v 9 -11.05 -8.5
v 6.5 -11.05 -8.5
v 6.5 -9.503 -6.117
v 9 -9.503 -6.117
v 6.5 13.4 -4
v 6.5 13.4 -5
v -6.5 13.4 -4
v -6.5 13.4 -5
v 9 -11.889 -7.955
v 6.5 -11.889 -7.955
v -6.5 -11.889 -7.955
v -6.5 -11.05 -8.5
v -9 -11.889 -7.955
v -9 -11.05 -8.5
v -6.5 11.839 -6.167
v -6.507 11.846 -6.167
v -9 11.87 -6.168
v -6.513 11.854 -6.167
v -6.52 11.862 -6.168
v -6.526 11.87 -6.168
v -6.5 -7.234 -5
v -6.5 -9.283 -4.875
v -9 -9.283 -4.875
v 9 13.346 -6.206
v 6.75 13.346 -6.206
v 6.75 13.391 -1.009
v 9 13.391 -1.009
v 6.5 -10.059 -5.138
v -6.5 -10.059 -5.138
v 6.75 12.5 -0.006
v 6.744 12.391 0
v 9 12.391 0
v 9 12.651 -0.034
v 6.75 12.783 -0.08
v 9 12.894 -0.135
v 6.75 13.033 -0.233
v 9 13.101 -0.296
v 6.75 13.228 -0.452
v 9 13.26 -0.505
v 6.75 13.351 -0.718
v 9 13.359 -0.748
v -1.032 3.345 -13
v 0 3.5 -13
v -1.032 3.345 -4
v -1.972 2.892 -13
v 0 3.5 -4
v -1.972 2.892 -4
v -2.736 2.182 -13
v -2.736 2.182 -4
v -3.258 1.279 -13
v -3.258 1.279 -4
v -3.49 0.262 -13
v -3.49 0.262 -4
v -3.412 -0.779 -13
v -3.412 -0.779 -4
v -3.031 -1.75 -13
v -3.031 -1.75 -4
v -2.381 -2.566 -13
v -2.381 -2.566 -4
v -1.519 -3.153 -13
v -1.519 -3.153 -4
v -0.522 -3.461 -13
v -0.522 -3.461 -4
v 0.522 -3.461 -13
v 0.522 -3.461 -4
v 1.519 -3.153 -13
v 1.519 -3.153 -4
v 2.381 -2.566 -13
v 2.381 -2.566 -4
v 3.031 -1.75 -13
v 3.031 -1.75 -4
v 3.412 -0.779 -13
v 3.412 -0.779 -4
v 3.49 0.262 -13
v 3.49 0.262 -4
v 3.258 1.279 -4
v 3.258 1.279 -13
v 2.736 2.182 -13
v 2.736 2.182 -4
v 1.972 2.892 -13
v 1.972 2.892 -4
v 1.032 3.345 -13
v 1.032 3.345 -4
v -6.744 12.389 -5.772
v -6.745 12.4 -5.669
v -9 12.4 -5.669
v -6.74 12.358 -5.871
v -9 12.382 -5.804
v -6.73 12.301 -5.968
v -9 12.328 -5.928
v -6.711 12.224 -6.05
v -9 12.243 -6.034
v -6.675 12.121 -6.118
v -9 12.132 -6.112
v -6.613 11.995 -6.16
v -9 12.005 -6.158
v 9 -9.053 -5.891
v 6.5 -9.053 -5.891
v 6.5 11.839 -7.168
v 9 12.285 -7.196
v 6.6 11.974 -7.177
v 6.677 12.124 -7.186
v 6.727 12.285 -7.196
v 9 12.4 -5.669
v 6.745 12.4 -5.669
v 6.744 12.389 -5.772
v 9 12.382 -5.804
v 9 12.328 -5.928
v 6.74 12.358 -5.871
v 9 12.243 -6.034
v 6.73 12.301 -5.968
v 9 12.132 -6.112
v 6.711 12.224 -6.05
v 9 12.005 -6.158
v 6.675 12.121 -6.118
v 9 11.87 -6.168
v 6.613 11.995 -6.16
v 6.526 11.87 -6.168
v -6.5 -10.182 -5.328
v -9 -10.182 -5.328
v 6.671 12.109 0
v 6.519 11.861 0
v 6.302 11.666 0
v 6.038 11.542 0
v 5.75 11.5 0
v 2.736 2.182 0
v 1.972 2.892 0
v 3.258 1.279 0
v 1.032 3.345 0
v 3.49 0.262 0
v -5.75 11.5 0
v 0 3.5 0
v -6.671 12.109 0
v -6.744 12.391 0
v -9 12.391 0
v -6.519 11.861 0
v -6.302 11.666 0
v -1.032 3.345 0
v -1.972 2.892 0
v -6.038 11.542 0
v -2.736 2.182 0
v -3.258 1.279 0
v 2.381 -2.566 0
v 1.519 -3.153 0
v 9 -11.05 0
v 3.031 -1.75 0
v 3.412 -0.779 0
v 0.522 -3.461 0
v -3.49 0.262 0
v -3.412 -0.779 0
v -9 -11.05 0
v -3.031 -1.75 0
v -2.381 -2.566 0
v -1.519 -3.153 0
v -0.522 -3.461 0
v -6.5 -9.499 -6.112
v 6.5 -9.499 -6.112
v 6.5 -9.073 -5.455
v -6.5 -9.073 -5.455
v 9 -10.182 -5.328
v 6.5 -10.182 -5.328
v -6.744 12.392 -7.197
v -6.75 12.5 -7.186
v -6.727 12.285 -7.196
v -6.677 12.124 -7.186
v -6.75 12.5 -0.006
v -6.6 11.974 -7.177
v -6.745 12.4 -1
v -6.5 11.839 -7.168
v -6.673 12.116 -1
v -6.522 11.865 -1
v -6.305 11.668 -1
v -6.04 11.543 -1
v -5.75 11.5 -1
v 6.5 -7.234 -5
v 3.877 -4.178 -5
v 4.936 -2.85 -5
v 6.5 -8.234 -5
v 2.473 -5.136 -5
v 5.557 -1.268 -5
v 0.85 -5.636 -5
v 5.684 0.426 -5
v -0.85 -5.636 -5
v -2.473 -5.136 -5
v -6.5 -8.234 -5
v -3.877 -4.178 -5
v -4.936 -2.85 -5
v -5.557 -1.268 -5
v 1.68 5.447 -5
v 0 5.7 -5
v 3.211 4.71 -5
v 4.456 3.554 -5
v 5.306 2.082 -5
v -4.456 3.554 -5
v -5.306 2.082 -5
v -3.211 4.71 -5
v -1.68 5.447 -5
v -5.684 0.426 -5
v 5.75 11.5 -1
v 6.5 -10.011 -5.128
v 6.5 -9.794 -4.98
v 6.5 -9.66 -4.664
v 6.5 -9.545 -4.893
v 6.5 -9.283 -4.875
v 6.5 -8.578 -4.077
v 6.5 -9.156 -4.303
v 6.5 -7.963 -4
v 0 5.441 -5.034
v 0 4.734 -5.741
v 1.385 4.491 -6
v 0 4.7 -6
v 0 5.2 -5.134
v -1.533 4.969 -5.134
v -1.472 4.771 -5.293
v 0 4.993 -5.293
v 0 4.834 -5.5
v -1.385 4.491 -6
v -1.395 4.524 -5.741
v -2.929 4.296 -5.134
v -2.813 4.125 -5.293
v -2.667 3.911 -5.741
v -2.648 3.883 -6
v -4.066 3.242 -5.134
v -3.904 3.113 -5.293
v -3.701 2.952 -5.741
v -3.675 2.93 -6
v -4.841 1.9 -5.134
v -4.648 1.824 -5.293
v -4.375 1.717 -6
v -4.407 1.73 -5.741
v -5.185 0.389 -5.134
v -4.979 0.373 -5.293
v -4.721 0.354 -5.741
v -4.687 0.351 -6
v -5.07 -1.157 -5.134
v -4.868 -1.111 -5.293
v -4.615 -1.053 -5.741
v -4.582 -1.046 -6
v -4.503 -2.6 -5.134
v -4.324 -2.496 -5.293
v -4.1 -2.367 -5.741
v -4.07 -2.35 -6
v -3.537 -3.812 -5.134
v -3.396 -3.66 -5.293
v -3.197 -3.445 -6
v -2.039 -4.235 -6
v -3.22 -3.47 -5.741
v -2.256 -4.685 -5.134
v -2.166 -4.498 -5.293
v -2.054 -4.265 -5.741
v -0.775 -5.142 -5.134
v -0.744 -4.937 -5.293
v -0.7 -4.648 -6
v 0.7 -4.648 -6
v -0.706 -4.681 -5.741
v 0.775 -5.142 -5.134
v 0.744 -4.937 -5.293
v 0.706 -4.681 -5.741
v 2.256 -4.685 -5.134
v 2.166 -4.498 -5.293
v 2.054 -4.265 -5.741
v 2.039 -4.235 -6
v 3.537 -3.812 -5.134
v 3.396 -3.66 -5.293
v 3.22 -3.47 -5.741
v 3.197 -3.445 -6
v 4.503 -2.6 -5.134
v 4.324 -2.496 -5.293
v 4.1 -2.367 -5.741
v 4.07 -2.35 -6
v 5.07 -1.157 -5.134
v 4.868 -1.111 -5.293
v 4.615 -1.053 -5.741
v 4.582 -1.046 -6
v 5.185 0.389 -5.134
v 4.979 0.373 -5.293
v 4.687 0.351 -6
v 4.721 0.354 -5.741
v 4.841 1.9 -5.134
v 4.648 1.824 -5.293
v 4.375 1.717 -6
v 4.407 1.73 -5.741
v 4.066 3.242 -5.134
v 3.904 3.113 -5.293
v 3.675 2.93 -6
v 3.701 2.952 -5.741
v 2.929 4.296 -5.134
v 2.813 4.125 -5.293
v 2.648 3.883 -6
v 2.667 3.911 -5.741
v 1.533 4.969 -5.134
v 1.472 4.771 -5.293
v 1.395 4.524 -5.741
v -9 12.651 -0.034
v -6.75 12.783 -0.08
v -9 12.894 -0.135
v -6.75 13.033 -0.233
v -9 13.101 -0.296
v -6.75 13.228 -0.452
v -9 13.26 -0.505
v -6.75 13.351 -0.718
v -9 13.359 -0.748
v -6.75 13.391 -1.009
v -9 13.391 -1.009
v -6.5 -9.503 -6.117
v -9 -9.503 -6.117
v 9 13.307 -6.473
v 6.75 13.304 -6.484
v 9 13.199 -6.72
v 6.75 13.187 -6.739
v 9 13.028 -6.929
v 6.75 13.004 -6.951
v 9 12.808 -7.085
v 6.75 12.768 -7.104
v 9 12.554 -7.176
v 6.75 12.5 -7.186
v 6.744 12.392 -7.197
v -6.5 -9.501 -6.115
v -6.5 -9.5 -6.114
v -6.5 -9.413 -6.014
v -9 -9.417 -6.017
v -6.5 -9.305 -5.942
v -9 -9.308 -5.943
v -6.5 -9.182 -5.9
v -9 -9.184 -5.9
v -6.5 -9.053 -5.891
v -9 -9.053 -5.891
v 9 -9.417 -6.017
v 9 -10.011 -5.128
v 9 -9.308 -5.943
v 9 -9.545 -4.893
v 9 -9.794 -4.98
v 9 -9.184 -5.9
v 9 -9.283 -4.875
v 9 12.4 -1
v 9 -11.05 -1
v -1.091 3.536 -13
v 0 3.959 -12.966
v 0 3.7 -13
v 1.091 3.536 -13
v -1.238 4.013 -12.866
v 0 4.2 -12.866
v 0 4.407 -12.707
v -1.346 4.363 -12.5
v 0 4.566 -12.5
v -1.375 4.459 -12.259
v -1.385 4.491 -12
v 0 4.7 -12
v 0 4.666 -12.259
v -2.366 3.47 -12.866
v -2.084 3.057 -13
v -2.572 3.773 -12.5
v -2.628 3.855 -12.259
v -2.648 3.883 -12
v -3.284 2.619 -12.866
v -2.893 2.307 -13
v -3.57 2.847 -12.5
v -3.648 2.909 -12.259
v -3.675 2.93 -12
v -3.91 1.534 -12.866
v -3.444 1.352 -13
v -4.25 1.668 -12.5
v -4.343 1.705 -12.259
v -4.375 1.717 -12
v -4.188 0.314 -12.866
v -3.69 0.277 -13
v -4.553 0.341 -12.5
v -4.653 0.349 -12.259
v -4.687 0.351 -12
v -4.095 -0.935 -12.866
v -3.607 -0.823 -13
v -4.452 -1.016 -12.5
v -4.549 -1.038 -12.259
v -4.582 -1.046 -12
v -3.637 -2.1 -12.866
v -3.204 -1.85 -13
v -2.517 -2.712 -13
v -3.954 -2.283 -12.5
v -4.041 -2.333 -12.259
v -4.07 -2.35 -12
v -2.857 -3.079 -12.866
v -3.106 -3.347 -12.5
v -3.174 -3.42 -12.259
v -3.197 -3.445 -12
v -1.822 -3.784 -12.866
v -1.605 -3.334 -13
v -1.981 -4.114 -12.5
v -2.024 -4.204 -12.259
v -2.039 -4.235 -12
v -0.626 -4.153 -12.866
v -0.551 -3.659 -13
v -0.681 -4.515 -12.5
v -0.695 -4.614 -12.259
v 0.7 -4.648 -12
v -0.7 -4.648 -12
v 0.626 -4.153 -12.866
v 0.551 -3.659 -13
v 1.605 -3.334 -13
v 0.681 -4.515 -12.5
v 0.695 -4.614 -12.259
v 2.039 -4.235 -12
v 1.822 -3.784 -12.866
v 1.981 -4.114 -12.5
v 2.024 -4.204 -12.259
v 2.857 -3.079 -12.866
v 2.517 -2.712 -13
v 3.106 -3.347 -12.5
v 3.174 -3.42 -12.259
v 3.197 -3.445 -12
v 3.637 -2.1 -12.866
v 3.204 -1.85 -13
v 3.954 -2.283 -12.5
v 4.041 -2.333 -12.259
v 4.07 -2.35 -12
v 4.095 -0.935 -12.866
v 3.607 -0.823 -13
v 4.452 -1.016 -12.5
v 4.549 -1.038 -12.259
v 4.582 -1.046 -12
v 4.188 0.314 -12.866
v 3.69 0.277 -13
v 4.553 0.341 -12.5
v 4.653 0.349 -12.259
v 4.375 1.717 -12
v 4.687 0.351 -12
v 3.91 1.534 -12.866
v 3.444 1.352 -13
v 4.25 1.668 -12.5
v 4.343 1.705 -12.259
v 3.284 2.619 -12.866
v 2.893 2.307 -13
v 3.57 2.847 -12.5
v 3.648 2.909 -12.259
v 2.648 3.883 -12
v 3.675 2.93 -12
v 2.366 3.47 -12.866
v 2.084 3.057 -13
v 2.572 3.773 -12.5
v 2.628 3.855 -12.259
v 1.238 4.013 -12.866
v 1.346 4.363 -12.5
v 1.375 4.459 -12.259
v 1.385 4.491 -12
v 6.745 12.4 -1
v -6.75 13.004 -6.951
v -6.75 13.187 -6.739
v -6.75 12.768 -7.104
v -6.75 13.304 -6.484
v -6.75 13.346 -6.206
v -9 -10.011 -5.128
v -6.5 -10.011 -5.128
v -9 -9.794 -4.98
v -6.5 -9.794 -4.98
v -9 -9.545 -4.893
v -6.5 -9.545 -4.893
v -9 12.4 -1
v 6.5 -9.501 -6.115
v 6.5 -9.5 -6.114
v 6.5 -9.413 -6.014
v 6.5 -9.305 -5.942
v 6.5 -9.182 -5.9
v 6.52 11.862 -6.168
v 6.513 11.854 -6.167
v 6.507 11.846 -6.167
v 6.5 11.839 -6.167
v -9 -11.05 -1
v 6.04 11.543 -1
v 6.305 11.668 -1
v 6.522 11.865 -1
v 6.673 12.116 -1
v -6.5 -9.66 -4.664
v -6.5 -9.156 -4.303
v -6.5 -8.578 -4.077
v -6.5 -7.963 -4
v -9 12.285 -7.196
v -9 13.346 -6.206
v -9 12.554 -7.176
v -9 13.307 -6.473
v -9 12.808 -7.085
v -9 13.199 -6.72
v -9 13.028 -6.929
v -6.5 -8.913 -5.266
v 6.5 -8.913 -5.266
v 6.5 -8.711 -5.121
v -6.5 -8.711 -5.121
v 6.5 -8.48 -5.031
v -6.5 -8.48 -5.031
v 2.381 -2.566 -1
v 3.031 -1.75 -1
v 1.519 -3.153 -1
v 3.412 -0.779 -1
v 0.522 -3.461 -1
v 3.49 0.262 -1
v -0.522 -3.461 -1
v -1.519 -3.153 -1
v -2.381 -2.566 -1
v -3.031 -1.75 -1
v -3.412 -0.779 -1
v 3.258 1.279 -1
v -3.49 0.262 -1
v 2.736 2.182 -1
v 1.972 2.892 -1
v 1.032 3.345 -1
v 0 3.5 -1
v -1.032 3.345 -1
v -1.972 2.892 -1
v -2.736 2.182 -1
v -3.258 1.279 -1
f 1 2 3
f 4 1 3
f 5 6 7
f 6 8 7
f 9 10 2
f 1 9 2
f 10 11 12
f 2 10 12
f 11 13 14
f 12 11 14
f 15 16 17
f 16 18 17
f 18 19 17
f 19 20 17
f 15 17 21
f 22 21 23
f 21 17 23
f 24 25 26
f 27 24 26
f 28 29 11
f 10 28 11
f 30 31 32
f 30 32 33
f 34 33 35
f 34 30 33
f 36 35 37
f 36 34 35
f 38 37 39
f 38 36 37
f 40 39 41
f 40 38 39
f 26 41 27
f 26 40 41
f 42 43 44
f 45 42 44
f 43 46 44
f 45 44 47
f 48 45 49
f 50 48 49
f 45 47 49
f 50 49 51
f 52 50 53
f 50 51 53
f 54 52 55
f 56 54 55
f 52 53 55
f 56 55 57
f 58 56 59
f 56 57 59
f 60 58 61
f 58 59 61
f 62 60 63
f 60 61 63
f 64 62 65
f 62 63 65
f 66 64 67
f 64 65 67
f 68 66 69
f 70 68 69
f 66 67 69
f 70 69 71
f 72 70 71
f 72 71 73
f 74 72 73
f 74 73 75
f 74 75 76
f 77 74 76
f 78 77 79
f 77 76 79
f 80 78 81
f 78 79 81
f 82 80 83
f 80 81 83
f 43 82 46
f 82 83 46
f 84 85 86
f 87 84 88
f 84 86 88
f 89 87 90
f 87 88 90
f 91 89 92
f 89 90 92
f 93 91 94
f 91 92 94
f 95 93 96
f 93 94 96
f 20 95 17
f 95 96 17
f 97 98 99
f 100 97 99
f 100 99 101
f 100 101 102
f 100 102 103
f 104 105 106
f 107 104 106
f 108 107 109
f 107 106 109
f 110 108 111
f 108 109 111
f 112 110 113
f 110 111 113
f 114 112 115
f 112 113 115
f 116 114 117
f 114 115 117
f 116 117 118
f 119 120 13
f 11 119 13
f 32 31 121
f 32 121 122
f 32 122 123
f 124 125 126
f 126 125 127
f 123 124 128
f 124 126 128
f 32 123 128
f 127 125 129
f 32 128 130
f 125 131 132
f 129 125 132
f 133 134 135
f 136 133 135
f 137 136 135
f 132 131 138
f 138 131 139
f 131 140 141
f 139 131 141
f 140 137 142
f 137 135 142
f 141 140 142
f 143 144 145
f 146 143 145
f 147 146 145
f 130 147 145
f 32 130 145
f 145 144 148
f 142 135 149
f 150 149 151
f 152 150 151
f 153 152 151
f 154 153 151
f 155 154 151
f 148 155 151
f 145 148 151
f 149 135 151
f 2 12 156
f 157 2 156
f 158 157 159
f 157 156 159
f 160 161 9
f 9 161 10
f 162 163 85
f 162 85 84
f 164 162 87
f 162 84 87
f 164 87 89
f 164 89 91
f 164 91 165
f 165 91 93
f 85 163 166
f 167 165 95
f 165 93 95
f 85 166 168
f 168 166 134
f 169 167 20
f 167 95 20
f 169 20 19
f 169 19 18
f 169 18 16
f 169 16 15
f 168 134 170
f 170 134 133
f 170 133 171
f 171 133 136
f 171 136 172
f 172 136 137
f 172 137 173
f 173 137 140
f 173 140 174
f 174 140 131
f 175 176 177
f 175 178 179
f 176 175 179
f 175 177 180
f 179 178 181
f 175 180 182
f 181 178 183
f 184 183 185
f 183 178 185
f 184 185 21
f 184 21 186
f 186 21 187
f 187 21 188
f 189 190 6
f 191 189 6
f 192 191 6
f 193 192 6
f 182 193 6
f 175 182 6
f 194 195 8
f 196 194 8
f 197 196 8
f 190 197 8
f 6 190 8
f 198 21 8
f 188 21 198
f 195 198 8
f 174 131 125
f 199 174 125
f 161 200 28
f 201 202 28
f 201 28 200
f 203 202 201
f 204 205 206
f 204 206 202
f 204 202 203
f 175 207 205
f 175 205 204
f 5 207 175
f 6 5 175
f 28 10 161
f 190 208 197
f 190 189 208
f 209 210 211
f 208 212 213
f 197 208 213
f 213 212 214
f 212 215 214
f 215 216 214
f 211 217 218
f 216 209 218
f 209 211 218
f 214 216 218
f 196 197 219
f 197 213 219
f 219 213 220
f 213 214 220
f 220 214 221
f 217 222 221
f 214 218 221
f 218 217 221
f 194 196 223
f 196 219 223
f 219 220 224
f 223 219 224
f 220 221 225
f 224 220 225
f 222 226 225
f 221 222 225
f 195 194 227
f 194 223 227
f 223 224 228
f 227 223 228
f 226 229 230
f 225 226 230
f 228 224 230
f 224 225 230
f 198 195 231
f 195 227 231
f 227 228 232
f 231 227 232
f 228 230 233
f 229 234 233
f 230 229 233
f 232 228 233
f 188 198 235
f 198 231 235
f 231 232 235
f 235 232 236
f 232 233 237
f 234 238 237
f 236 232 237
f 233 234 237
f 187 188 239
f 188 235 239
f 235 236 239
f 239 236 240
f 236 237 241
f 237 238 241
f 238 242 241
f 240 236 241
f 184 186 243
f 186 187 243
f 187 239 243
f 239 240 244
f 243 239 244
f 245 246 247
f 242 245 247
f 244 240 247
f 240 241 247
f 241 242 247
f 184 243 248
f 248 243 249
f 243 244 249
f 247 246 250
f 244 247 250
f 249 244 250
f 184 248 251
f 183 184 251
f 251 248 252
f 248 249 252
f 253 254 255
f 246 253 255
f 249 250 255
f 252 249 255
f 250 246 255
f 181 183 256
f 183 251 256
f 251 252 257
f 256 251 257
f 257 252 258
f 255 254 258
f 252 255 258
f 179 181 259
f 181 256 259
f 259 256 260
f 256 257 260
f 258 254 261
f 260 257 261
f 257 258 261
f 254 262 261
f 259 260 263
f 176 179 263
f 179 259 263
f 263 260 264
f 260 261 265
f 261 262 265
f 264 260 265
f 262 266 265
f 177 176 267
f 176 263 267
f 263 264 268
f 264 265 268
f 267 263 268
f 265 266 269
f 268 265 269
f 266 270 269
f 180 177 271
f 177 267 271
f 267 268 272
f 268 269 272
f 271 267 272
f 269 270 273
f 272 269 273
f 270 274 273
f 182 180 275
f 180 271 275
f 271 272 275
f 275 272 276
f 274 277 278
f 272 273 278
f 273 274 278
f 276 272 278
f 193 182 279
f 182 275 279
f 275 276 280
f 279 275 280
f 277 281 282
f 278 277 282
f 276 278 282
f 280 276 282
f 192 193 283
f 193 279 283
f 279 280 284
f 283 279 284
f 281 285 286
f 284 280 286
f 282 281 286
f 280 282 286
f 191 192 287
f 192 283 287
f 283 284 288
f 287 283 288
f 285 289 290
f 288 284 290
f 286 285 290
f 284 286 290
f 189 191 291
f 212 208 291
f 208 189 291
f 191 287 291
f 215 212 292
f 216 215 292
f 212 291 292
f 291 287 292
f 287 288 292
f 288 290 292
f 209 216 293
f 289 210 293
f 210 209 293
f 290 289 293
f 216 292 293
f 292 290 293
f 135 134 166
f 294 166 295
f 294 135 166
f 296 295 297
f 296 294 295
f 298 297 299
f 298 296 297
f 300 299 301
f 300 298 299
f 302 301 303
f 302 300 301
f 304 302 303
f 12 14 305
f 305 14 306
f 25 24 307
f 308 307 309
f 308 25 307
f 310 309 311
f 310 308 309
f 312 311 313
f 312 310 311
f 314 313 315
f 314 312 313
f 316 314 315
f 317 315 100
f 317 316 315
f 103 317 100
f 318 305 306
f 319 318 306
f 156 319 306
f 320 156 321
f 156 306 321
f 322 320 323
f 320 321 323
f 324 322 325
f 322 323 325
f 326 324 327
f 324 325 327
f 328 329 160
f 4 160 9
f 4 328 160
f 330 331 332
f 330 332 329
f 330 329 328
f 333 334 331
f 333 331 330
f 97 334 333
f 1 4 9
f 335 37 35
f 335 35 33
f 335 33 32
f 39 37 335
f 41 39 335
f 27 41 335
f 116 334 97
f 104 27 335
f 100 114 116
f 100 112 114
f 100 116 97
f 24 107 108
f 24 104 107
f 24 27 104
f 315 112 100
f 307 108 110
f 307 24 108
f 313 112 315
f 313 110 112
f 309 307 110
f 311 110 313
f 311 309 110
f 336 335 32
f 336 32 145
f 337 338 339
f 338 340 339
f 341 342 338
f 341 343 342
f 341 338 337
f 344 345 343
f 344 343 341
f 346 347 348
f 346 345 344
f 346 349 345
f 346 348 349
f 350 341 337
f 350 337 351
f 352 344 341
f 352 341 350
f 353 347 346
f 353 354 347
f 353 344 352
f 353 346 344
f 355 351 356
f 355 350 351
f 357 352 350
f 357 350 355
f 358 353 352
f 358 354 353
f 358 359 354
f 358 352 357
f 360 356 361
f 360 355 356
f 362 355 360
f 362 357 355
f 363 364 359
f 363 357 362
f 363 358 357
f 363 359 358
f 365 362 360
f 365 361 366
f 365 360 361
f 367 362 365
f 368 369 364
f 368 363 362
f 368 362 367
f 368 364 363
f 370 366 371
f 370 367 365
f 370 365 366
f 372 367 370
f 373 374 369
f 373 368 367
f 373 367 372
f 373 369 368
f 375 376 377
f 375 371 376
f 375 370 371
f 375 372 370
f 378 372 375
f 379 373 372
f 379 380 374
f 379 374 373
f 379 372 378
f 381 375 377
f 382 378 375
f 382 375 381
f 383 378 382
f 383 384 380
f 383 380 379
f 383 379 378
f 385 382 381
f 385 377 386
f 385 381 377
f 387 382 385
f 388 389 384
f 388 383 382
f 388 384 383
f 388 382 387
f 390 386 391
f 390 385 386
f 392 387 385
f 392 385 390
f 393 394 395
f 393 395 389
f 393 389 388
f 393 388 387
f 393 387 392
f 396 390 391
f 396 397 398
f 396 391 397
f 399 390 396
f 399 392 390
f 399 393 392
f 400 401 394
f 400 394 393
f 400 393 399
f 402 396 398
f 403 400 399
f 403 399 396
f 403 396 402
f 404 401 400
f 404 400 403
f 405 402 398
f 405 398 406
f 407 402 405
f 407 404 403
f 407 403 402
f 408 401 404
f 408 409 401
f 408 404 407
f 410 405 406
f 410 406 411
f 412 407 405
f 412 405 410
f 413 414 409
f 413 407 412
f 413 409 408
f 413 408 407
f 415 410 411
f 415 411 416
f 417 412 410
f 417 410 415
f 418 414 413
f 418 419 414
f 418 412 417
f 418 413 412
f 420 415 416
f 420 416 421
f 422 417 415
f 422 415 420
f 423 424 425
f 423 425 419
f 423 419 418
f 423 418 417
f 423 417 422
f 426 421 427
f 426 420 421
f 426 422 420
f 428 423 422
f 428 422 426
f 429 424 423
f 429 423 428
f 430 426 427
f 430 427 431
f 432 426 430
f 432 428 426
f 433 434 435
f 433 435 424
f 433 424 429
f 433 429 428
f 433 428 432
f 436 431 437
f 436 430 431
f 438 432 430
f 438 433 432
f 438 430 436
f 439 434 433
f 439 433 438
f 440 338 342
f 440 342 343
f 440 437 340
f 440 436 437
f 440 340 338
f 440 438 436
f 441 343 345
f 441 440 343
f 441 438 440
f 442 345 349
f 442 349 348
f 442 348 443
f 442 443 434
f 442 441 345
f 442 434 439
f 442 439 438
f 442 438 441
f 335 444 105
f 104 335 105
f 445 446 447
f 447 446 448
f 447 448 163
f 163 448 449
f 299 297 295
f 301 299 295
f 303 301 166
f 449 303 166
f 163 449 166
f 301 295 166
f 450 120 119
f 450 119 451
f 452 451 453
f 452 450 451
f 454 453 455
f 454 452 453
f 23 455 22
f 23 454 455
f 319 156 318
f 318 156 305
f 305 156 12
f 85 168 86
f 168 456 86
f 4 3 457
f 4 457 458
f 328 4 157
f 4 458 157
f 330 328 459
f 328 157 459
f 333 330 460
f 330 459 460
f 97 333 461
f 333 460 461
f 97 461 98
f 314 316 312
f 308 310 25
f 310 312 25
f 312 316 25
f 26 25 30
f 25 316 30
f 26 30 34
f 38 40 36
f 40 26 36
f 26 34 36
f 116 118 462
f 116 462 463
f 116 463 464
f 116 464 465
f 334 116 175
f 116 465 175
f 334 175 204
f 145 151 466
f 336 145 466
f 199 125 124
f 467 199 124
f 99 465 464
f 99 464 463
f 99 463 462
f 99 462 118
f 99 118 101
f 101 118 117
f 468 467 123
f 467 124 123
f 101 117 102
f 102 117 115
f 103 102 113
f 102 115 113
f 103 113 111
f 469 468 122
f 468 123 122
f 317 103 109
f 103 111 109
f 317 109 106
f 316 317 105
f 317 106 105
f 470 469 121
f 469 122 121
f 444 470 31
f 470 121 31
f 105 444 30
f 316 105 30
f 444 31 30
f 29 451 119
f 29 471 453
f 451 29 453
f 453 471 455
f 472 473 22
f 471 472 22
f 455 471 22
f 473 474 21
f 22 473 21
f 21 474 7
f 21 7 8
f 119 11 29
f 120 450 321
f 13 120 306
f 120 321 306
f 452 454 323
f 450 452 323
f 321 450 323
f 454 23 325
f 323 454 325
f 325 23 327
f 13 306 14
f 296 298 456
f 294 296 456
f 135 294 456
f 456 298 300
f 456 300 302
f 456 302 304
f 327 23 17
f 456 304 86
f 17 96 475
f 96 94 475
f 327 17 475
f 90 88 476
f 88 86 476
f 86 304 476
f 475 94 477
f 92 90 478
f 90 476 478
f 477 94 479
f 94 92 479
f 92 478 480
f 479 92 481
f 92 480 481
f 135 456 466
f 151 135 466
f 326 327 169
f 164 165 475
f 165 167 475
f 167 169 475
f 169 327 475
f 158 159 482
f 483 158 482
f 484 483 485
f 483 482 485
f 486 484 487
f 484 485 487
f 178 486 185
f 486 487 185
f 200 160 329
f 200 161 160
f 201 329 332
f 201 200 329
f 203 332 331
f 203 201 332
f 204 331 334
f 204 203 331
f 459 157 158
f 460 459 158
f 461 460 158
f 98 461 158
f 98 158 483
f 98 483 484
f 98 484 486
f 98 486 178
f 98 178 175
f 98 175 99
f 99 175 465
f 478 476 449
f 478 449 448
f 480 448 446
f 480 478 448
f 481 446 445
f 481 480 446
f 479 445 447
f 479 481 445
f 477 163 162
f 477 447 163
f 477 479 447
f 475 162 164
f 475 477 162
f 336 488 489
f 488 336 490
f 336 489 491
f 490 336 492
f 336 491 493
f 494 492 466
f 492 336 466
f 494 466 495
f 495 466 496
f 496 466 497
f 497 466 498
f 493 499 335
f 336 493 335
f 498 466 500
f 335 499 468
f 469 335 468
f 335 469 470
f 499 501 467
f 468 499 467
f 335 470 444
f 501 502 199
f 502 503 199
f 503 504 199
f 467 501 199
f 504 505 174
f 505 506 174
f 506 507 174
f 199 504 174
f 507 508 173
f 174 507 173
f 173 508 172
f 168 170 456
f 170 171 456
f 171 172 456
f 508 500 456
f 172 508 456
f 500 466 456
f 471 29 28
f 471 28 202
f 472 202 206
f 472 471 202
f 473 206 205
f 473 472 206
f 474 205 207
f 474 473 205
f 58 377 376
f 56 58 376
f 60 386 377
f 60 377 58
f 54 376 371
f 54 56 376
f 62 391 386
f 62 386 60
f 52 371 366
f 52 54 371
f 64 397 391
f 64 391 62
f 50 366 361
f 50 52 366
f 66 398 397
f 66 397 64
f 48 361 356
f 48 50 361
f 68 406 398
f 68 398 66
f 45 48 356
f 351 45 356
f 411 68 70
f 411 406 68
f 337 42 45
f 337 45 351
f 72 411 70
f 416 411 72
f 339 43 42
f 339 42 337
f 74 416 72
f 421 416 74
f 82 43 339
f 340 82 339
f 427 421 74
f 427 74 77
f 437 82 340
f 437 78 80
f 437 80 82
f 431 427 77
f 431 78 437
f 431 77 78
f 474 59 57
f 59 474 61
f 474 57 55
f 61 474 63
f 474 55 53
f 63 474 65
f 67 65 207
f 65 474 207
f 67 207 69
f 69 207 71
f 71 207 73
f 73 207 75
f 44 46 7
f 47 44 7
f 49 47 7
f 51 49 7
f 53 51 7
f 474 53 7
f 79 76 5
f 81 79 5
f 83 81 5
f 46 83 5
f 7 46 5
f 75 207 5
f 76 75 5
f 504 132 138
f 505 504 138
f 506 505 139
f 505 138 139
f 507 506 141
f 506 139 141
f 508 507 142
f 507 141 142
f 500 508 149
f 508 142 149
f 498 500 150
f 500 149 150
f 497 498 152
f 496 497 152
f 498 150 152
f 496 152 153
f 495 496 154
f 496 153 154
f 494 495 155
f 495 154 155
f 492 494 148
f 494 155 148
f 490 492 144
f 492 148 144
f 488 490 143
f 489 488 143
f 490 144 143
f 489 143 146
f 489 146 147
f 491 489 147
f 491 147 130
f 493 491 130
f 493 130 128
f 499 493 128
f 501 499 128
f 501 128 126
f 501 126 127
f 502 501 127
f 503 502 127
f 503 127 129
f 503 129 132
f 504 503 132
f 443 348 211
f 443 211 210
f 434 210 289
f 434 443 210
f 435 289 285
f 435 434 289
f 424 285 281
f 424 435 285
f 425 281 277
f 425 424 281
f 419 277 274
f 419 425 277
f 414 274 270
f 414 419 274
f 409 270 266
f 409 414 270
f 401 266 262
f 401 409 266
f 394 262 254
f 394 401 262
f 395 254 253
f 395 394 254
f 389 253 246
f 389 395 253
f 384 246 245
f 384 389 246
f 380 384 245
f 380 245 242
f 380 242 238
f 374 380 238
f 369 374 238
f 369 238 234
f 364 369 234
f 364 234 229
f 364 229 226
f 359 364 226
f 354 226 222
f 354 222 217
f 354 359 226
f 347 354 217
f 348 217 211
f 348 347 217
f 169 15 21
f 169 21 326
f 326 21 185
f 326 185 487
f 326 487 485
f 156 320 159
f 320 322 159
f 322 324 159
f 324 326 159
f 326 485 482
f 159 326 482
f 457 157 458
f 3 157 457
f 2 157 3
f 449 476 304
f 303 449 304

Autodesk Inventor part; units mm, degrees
sketch "Sketch_1" plane through (0, 0, 0) normal (1, 0, 0) x (0, 0, -1)
  line L0 (0, 12.3912) -> (0, -11.05)
  line L1 (0, -11.05) -> (1, -11.05)
  line L2 (1, -11.05) -> (1, 12.4)
  line L3 (1, 12.4) -> (5.6693, 12.4)
  arc A0 (6.1684, 11.8695) -> (5.6693, 12.4) centre (5.6693, 11.9) ccw
  line L4 (6.1684, 11.8695) -> (4.8747, -9.2828)
  arc A1 (4.8747, -9.2828) -> (5.3282, -10.1825) centre (5.8728, -9.3439) ccw
  line L5 (5.3282, -10.1825) -> (7.9554, -11.8887)
  line L6 (7.9554, -11.8887) -> (8.5, -11.05)
  line L7 (8.5, -11.05) -> (6.1173, -9.5027)
  arc A2 (5.8906, -9.0528) -> (6.1173, -9.5027) centre (6.3897, -9.0834) ccw
  line L8 (5.8906, -9.0528) -> (7.1957, 12.2848)
  arc A3 (7.1957, 12.2848) -> (6.2063, 13.3458) centre (6.1975, 12.3459) ccw
  line L9 (6.2063, 13.3458) -> (1.0087, 13.3912)
  arc A4 (1.0087, 13.3912) -> (0, 12.3912) centre (1, 12.3912) ccw
extrude "Extrusion1" add sketch "Sketch_1" along normal mid plane 18
sketch "Sketch_2" plane through (0, 0, 0) normal (0, 0, 1) x (1, 0, 0)
  line L0 (-6.75, 16.5) -> (-6.75, 12.5)
  arc A0 (-6.75, 12.5) -> (-5.75, 11.5) centre (-5.75, 12.5) ccw
  line L1 (-5.75, 11.5) -> (5.75, 11.5)
  arc A1 (5.75, 11.5) -> (6.75, 12.5) centre (5.75, 12.5) ccw
  line L2 (6.75, 12.5) -> (6.75, 16.5)
  line L3 (6.75, 16.5) -> (-6.75, 16.5)
extrude "Extrusion2" cut sketch "Sketch_2" against normal blind 8
sketch "Sketch_3" plane through (0, 0, -1) normal (0, 0, 1) x (1, 0, 0)
  line L0 (-6.5, -12) -> (6.5, -12)
  line L1 (6.5, -12) -> (6.5, 13)
  line L2 (6.5, 13) -> (-6.5, 13)
  line L3 (-6.5, 13) -> (-6.5, -12)
extrude "Extrusion3" cut sketch "Sketch_3" against normal blind 8
sketch "Sketch_4" plane through (0, 0, 0) normal (1, 0, 0) x (0, 0, -1)
  arc A0 (4, -7.9626) -> (5.1384, -10.0593) centre (6.5, -7.9626) ccw
  line L0 (5.1384, -10.0593) -> (7.9554, -11.8887)
  line L1 (7.9554, -11.8887) -> (8.5, -11.05)
  line L2 (8.5, -11.05) -> (5.4554, -9.0728)
  arc A1 (5, -8.2341) -> (5.4554, -9.0728) centre (6, -8.2341) ccw
  line L3 (5, -8.2341) -> (5, 13.4)
  line L4 (5, 13.4) -> (4, 13.4)
  line L5 (4, 13.4) -> (4, -7.9626)
extrude "Extrusion4" add sketch "Sketch_4" along normal mid plane 13
sketch "Sketch_5" plane through (0, 0, 0) normal (1, 0, 0) x (0, 0, -1)
  line L0 (13, 0) -> (4, 0)
  line L1 (4, 0) -> (4, 5.7)
  line L2 (4, 5.7) -> (5, 5.7)
  arc A0 (5, 5.7) -> (6, 4.7) centre (6, 5.7) ccw
  line L3 (6, 4.7) -> (12, 4.7)
  arc A1 (13, 3.7) -> (12, 4.7) centre (12, 3.7) ccw
  line L4 (13, 3.7) -> (13, 0)
  line L5 (13, 0) -> (4, 0)
revolve "Revolution1" add sketch "Sketch_5" angle 360 about axis through (0, 0, -13) along (0, 0, -1)
sketch "Sketch6" plane through (0, 0, -13) normal (0, 0, -1) x (-1, 0, 0)
  point P0 (0, 0)
hole "Hole1" at (0, 0, -13) direction (0, 0, 1) diameter 7 depth 14
ref_plane "P3_XY" through (0, 0, 0) normal (0, 0, -1) x (1, 0, 0)
ref_plane "P3_YZ" through (0, 0, 0) normal (1, 0, 0) x (0, -1, 0)
ref_plane "P3_ZX" through (0, 0, 0) normal (0, -1, 0) x (0, 0, -1)
properties part number "8617.540_P3"
